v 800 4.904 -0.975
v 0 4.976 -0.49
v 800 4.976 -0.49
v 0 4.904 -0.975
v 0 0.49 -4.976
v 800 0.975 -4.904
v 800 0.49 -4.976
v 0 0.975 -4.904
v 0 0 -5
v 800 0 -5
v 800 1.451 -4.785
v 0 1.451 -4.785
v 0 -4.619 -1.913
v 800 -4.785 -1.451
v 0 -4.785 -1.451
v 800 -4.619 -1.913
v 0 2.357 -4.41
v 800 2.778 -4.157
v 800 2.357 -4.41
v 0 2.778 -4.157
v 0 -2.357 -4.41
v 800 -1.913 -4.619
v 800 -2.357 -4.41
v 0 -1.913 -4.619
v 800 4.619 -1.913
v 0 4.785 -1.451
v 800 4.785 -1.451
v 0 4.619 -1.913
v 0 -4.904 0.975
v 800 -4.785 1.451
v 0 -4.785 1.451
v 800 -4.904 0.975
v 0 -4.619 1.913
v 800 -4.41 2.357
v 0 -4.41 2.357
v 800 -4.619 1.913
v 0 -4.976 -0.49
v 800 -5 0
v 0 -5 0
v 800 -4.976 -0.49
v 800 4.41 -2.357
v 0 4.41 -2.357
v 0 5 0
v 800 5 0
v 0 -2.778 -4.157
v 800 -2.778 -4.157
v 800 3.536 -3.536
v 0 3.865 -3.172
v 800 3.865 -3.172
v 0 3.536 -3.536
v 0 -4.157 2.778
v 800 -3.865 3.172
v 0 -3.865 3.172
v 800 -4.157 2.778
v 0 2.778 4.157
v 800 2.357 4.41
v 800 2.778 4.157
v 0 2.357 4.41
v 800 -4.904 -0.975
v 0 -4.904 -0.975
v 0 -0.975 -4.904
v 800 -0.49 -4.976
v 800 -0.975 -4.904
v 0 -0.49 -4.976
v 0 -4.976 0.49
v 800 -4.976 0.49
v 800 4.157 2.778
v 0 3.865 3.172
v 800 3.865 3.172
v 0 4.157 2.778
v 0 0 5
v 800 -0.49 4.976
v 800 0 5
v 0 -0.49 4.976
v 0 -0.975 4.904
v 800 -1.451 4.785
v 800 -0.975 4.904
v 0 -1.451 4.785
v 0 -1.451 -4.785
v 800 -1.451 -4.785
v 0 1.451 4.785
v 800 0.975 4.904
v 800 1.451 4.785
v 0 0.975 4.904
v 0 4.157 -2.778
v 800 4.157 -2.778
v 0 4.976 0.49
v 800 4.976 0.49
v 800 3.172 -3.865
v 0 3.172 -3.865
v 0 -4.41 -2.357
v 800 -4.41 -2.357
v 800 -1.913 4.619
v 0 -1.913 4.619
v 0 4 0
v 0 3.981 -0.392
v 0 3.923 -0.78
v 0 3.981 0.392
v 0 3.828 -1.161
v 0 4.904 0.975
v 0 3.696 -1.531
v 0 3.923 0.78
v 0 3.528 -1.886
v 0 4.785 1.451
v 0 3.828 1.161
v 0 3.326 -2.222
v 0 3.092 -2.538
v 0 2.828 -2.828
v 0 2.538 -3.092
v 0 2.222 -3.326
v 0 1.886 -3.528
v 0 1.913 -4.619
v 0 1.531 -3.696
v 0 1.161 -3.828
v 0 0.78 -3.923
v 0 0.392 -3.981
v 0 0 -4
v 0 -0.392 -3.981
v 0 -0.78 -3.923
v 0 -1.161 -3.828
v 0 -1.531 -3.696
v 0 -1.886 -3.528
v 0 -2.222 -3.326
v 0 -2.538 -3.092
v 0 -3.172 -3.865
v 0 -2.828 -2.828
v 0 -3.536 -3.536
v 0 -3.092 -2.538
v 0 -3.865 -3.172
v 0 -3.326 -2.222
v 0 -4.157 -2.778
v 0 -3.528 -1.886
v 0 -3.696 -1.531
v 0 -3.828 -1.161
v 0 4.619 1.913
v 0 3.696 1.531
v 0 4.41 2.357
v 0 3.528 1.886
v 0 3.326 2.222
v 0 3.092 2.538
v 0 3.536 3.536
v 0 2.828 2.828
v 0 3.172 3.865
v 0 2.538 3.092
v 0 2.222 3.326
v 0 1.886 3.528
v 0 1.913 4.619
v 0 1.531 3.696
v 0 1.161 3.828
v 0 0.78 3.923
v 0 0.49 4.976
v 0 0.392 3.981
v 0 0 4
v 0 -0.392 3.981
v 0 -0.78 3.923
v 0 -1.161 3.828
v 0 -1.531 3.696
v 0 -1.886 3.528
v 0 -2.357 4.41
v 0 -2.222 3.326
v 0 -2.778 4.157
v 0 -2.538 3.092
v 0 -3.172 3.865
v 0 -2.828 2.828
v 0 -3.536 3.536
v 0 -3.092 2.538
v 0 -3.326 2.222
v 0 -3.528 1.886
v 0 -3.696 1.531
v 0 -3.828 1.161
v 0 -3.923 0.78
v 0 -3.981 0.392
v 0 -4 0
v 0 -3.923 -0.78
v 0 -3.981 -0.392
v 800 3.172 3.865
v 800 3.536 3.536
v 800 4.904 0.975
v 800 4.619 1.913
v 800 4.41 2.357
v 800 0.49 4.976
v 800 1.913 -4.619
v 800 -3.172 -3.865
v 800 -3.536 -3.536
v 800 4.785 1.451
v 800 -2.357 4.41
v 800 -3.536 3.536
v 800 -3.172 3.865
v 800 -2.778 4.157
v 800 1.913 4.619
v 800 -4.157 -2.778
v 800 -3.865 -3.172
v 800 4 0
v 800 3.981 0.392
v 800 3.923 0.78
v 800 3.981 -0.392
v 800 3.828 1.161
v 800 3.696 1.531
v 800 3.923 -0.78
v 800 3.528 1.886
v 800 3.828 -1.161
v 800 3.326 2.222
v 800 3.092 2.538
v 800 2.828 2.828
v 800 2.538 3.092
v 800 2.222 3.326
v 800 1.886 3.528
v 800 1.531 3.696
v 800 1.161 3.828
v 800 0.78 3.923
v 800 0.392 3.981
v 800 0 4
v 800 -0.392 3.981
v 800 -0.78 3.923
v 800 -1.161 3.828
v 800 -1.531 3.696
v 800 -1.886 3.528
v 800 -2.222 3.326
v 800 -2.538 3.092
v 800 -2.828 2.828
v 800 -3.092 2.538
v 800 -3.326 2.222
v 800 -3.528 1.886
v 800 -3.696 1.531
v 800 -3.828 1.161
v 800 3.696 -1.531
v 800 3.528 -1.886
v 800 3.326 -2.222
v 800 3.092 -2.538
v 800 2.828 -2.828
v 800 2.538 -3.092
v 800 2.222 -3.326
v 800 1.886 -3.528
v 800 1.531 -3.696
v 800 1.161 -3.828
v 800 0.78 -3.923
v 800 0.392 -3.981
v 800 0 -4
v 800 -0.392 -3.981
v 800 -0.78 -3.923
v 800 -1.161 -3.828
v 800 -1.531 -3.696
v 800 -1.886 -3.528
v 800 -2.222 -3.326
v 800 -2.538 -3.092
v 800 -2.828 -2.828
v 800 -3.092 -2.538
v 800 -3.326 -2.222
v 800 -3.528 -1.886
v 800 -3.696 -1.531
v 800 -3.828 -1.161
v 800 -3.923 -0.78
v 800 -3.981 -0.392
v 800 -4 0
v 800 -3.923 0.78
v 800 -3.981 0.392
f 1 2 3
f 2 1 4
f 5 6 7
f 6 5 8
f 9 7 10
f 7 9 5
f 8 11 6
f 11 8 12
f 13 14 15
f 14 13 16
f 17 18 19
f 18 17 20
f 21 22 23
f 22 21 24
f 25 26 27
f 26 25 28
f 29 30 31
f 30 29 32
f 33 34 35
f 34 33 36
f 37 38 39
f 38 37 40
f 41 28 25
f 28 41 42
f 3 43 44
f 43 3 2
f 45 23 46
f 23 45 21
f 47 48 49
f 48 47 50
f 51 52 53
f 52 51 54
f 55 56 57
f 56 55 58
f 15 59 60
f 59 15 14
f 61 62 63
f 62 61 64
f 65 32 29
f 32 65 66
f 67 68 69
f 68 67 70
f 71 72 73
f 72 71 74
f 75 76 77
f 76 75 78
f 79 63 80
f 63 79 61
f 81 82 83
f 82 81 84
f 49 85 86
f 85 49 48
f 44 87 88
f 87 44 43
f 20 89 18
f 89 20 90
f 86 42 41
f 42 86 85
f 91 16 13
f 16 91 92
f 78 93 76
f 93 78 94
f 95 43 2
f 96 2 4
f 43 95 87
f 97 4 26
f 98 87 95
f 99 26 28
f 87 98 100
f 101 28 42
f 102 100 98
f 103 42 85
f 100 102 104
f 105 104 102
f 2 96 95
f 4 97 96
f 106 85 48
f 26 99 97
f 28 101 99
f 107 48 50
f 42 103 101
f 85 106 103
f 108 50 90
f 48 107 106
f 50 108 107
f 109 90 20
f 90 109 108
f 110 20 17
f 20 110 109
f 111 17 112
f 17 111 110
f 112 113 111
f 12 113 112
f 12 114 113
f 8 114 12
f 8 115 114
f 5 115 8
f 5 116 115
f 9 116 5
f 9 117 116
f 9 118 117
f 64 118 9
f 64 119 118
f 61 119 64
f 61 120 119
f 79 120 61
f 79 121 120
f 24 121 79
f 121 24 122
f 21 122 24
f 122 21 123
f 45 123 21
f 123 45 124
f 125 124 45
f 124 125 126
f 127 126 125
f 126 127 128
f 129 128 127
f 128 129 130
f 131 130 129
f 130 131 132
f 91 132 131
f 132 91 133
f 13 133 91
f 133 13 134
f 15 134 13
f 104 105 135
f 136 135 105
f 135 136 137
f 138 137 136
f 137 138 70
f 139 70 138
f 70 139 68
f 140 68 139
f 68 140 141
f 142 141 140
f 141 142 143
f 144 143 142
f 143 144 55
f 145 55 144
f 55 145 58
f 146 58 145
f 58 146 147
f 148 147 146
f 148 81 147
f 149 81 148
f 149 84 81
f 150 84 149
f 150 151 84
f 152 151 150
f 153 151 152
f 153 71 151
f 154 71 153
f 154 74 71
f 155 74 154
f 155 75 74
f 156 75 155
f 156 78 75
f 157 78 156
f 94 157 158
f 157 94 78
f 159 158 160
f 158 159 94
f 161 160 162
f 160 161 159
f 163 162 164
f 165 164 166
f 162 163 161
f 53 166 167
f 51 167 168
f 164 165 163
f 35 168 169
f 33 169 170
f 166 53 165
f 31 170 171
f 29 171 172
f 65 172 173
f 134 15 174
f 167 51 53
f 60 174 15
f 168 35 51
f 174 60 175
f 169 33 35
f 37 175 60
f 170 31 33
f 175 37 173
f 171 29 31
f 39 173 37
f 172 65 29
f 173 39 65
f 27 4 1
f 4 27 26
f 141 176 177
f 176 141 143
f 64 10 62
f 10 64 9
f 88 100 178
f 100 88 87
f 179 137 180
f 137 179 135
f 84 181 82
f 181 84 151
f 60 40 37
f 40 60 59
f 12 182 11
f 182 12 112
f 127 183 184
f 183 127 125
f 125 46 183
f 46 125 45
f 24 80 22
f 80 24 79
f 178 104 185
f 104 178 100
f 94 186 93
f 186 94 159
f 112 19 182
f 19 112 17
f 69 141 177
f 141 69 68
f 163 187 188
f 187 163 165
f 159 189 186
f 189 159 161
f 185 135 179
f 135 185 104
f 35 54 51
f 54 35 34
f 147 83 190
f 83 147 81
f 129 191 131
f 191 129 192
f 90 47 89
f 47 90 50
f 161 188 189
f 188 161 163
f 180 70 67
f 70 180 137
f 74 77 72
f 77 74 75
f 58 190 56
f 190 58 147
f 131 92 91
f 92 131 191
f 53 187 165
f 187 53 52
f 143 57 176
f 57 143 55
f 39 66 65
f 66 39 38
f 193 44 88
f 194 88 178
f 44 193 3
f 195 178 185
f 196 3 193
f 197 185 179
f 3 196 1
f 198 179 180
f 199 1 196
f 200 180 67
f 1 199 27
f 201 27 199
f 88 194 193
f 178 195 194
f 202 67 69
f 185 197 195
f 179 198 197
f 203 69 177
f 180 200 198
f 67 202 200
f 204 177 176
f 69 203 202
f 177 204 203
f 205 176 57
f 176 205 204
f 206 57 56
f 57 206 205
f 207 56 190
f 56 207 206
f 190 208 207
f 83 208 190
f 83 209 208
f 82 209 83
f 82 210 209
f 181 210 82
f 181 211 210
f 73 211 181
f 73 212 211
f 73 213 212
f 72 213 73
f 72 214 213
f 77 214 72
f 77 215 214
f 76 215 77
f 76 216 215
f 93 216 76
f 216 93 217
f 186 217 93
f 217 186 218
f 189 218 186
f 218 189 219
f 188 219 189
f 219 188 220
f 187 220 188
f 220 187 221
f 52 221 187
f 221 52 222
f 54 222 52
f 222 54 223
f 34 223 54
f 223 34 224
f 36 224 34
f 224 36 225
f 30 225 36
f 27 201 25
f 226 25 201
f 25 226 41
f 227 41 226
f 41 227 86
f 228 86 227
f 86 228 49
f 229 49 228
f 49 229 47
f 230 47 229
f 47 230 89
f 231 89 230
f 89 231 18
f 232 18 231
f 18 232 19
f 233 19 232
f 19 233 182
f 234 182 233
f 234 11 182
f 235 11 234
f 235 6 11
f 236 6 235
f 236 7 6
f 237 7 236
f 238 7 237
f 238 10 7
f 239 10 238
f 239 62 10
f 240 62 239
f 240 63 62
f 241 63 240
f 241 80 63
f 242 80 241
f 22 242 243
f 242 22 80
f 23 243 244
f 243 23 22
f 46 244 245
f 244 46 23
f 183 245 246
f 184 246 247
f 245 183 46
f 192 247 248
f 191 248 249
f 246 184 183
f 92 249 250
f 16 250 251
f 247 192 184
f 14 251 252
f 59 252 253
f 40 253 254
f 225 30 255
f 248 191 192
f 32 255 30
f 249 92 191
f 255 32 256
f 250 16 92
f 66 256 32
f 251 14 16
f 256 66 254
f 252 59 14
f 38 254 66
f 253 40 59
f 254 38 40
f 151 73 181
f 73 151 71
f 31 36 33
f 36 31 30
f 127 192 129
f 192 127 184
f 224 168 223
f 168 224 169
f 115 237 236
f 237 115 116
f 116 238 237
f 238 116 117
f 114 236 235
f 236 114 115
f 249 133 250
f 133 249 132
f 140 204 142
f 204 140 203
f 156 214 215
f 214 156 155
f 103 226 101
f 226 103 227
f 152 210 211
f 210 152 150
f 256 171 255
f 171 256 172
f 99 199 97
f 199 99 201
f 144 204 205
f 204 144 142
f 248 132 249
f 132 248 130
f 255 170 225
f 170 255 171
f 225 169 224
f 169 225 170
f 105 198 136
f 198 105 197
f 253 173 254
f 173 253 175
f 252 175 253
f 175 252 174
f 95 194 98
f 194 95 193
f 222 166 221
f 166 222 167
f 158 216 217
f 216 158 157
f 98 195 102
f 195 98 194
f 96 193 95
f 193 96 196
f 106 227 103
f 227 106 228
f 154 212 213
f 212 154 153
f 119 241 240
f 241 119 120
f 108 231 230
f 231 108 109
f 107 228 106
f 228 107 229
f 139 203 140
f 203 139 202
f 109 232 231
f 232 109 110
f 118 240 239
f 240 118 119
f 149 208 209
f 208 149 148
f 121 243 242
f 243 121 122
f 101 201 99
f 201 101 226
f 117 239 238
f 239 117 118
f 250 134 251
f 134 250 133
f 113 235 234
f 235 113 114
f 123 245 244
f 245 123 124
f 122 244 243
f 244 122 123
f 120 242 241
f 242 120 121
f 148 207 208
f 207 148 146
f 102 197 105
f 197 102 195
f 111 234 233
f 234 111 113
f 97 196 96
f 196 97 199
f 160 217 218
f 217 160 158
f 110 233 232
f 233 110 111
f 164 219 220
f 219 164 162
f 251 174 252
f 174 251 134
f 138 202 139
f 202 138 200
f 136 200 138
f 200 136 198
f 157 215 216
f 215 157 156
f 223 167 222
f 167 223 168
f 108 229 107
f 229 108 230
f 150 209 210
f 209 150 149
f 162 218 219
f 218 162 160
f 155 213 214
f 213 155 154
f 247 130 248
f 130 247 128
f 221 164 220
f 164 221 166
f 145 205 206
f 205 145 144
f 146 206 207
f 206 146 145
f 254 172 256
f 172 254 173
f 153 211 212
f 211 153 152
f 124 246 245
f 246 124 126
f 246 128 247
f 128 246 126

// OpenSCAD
// HUB75 display frame - V1.2 aluminium stiffening tube
//
// Self-contained component.
// No project_config.scad dependency.

/* [Tube] */
tube_length = 800.0;
tube_outer_diameter = 10.0;
tube_wall_thickness = 1.0;

/* [Preview] */
preview_color = [0.72, 0.74, 0.76, 1];

/* [Resolution] */
$fn = 64;


module aluminium_stiffening_tube(
    length = tube_length,
    outer_diameter = tube_outer_diameter,
    wall_thickness = tube_wall_thickness,
    part_color = preview_color
) {
    inner_diameter =
        outer_diameter - 2 * wall_thickness;

    color(part_color)
        rotate([0, 90, 0])
            difference() {
                cylinder(
                    h=length,
                    d=outer_diameter
                );

                translate([0, 0, -0.1])
                    cylinder(
                        h=length + 0.2,
                        d=inner_diameter
                    );
            }
}


// Standalone preview
aluminium_stiffening_tube();
